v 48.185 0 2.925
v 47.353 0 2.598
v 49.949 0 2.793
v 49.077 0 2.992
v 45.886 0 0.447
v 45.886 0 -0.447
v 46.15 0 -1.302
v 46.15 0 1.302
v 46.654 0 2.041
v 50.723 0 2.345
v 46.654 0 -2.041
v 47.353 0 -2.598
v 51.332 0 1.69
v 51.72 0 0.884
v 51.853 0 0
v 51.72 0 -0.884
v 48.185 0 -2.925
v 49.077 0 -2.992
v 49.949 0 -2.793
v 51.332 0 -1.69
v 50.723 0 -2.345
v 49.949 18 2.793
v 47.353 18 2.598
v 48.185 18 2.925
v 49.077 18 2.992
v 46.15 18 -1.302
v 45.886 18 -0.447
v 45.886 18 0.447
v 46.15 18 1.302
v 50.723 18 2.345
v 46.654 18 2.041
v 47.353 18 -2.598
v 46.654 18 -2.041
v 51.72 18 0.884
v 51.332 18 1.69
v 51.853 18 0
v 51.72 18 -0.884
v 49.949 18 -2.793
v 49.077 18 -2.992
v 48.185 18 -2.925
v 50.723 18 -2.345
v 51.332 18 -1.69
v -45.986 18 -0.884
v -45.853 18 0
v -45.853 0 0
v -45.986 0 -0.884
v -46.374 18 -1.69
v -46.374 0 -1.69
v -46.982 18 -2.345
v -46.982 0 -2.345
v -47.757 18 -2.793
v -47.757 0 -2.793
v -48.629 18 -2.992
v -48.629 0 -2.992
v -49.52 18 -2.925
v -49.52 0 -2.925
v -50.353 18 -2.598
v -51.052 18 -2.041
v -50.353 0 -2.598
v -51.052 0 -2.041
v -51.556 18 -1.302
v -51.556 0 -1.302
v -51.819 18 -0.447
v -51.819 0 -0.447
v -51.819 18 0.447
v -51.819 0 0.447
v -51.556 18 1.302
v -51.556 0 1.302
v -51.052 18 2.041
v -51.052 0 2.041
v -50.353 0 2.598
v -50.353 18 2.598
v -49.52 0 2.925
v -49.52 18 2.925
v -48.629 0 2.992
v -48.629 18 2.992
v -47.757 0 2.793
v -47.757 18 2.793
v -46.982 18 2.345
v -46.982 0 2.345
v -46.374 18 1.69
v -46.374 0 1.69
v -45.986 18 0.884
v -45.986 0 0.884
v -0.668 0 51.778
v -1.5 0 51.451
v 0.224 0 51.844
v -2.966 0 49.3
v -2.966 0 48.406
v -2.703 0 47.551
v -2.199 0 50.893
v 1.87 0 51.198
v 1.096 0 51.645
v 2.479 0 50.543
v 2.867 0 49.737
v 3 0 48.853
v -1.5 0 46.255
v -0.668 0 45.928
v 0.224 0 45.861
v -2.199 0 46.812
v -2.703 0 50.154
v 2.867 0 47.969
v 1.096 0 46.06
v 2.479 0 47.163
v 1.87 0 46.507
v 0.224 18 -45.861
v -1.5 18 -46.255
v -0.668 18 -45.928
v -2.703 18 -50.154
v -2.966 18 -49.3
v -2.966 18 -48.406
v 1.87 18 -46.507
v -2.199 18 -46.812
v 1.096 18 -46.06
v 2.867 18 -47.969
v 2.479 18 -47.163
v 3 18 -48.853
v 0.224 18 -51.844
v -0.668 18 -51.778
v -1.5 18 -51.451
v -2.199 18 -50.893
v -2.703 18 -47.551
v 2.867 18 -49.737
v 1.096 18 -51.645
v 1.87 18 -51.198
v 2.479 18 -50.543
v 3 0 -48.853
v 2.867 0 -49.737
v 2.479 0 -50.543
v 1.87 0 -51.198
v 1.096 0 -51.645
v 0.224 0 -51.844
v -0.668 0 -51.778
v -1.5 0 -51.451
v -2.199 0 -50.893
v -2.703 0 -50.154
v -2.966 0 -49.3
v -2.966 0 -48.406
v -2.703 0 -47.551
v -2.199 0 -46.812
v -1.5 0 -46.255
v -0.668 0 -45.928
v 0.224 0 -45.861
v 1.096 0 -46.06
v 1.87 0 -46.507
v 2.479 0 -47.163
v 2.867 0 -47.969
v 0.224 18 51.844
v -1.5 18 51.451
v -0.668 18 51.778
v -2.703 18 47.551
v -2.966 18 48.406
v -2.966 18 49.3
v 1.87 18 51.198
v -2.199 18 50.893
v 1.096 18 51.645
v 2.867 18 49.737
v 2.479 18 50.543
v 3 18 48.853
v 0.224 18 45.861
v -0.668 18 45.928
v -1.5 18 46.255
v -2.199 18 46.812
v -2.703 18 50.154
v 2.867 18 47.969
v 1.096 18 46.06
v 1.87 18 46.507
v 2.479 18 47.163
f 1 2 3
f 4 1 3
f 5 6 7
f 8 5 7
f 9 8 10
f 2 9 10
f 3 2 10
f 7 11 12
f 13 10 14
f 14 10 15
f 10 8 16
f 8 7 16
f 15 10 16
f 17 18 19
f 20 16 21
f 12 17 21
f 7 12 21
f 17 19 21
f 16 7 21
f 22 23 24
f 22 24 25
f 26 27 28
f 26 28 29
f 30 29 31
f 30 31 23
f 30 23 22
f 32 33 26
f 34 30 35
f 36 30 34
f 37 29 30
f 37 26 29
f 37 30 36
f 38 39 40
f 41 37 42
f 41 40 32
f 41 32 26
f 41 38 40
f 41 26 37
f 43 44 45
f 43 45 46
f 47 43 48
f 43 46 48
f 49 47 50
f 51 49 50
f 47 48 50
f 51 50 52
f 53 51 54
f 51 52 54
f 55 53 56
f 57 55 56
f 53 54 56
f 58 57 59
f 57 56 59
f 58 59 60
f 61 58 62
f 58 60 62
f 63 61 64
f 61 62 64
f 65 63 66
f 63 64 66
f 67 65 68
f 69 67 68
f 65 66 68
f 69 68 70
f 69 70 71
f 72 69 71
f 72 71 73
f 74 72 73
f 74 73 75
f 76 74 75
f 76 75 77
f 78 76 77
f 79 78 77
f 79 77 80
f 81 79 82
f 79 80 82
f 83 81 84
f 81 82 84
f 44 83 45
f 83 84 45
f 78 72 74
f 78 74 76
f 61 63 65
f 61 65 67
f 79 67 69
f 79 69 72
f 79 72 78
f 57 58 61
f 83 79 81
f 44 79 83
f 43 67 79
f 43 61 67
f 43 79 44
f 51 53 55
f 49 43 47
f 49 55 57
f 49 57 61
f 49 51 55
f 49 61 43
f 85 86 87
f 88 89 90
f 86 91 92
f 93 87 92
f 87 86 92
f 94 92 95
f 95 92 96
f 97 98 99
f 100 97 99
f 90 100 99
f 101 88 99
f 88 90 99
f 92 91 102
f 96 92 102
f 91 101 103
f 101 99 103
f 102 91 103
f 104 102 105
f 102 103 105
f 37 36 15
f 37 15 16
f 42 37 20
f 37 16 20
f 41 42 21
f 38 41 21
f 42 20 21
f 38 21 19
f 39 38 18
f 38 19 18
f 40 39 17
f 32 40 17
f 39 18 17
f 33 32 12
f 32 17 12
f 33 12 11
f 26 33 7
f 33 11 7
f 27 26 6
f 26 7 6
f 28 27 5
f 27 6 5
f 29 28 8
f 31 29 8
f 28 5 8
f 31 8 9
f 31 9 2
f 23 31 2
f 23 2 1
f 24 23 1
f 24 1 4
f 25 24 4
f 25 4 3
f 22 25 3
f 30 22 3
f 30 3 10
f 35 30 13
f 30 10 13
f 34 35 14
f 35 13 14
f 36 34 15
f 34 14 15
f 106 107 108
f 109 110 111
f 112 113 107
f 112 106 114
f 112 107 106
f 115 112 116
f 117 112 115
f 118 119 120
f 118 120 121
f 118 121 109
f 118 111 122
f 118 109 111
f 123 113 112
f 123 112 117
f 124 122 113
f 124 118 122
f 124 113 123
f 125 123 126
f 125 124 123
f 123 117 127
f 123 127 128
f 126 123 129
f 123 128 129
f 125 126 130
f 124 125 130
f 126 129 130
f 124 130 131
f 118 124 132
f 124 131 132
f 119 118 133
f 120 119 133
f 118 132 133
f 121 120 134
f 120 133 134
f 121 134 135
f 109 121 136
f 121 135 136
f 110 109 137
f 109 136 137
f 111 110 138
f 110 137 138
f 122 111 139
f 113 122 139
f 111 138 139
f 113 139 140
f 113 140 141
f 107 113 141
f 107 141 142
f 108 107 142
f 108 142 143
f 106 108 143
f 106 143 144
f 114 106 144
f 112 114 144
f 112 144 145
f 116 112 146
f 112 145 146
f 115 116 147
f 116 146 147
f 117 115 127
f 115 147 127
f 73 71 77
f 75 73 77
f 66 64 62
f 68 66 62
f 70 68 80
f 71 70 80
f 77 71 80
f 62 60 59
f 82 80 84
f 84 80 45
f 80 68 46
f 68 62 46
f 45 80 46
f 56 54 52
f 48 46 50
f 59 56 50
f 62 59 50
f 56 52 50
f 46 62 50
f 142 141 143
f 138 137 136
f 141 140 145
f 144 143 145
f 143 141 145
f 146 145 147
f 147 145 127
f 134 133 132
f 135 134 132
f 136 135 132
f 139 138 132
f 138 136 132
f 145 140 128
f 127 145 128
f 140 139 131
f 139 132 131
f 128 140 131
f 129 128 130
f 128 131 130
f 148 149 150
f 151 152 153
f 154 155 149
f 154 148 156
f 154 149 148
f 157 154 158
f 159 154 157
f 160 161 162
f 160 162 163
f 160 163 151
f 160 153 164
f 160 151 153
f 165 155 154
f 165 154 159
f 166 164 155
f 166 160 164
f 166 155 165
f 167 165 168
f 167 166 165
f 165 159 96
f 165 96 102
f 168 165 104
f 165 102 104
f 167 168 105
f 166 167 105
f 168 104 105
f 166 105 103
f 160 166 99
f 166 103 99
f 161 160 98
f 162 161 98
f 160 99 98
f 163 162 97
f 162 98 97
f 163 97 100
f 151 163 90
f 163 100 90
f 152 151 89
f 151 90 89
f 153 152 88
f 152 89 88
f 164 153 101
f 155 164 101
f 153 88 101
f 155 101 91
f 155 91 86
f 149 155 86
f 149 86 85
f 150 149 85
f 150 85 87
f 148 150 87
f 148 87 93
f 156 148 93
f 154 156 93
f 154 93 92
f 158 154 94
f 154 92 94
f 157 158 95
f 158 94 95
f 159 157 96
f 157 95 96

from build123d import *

# Parameters (mm, degrees)
SKETCH_1_R        = 3
EXTRUDE_1_DEPTH   = 18
SKETCH_1_R_2      = 2.999961644
EXTRUDE_1_2_DEPTH = 18
EXTRUDE_1_3_DEPTH = 18
EXTRUDE_1_4_DEPTH = 18


with BuildPart() as part:
    # 草图1 → 凸台-拉伸1 (new body)
    with BuildSketch(Plane(origin=(0, 0, 0), x_dir=(1, 0, 0), z_dir=(0, 1, 0))):
        with Locations((-48.852813742, 0)):
            Circle(SKETCH_1_R)
    extrude(amount=EXTRUDE_1_DEPTH)


with BuildPart() as body_2:
    # 草图1 → Extrude 1 2 (new body)
    with BuildSketch(Plane(origin=(0, 0, 0), x_dir=(1, 0, 0), z_dir=(0, 1, 0))):
        with Locations((0, 48.852813742)):
            Circle(SKETCH_1_R_2)
    extrude(amount=EXTRUDE_1_2_DEPTH)


with BuildPart() as body_3:
    # 草图1 → Extrude 1 3 (new body)
    with BuildSketch(Plane(origin=(0, 0, 0), x_dir=(1, 0, 0), z_dir=(0, 1, 0))):
        with Locations((0, -48.852813742)):
            Circle(SKETCH_1_R_2)
    extrude(amount=EXTRUDE_1_3_DEPTH)


with BuildPart() as body_4:
    # 草图1 → Extrude 1 4 (new body)
    with BuildSketch(Plane(origin=(0, 0, 0), x_dir=(1, 0, 0), z_dir=(0, 1, 0))):
        with Locations((48.852813742, 0)):
            Circle(SKETCH_1_R)
    extrude(amount=EXTRUDE_1_4_DEPTH)


solid = Compound([part.part, body_2.part, body_3.part, body_4.part])
